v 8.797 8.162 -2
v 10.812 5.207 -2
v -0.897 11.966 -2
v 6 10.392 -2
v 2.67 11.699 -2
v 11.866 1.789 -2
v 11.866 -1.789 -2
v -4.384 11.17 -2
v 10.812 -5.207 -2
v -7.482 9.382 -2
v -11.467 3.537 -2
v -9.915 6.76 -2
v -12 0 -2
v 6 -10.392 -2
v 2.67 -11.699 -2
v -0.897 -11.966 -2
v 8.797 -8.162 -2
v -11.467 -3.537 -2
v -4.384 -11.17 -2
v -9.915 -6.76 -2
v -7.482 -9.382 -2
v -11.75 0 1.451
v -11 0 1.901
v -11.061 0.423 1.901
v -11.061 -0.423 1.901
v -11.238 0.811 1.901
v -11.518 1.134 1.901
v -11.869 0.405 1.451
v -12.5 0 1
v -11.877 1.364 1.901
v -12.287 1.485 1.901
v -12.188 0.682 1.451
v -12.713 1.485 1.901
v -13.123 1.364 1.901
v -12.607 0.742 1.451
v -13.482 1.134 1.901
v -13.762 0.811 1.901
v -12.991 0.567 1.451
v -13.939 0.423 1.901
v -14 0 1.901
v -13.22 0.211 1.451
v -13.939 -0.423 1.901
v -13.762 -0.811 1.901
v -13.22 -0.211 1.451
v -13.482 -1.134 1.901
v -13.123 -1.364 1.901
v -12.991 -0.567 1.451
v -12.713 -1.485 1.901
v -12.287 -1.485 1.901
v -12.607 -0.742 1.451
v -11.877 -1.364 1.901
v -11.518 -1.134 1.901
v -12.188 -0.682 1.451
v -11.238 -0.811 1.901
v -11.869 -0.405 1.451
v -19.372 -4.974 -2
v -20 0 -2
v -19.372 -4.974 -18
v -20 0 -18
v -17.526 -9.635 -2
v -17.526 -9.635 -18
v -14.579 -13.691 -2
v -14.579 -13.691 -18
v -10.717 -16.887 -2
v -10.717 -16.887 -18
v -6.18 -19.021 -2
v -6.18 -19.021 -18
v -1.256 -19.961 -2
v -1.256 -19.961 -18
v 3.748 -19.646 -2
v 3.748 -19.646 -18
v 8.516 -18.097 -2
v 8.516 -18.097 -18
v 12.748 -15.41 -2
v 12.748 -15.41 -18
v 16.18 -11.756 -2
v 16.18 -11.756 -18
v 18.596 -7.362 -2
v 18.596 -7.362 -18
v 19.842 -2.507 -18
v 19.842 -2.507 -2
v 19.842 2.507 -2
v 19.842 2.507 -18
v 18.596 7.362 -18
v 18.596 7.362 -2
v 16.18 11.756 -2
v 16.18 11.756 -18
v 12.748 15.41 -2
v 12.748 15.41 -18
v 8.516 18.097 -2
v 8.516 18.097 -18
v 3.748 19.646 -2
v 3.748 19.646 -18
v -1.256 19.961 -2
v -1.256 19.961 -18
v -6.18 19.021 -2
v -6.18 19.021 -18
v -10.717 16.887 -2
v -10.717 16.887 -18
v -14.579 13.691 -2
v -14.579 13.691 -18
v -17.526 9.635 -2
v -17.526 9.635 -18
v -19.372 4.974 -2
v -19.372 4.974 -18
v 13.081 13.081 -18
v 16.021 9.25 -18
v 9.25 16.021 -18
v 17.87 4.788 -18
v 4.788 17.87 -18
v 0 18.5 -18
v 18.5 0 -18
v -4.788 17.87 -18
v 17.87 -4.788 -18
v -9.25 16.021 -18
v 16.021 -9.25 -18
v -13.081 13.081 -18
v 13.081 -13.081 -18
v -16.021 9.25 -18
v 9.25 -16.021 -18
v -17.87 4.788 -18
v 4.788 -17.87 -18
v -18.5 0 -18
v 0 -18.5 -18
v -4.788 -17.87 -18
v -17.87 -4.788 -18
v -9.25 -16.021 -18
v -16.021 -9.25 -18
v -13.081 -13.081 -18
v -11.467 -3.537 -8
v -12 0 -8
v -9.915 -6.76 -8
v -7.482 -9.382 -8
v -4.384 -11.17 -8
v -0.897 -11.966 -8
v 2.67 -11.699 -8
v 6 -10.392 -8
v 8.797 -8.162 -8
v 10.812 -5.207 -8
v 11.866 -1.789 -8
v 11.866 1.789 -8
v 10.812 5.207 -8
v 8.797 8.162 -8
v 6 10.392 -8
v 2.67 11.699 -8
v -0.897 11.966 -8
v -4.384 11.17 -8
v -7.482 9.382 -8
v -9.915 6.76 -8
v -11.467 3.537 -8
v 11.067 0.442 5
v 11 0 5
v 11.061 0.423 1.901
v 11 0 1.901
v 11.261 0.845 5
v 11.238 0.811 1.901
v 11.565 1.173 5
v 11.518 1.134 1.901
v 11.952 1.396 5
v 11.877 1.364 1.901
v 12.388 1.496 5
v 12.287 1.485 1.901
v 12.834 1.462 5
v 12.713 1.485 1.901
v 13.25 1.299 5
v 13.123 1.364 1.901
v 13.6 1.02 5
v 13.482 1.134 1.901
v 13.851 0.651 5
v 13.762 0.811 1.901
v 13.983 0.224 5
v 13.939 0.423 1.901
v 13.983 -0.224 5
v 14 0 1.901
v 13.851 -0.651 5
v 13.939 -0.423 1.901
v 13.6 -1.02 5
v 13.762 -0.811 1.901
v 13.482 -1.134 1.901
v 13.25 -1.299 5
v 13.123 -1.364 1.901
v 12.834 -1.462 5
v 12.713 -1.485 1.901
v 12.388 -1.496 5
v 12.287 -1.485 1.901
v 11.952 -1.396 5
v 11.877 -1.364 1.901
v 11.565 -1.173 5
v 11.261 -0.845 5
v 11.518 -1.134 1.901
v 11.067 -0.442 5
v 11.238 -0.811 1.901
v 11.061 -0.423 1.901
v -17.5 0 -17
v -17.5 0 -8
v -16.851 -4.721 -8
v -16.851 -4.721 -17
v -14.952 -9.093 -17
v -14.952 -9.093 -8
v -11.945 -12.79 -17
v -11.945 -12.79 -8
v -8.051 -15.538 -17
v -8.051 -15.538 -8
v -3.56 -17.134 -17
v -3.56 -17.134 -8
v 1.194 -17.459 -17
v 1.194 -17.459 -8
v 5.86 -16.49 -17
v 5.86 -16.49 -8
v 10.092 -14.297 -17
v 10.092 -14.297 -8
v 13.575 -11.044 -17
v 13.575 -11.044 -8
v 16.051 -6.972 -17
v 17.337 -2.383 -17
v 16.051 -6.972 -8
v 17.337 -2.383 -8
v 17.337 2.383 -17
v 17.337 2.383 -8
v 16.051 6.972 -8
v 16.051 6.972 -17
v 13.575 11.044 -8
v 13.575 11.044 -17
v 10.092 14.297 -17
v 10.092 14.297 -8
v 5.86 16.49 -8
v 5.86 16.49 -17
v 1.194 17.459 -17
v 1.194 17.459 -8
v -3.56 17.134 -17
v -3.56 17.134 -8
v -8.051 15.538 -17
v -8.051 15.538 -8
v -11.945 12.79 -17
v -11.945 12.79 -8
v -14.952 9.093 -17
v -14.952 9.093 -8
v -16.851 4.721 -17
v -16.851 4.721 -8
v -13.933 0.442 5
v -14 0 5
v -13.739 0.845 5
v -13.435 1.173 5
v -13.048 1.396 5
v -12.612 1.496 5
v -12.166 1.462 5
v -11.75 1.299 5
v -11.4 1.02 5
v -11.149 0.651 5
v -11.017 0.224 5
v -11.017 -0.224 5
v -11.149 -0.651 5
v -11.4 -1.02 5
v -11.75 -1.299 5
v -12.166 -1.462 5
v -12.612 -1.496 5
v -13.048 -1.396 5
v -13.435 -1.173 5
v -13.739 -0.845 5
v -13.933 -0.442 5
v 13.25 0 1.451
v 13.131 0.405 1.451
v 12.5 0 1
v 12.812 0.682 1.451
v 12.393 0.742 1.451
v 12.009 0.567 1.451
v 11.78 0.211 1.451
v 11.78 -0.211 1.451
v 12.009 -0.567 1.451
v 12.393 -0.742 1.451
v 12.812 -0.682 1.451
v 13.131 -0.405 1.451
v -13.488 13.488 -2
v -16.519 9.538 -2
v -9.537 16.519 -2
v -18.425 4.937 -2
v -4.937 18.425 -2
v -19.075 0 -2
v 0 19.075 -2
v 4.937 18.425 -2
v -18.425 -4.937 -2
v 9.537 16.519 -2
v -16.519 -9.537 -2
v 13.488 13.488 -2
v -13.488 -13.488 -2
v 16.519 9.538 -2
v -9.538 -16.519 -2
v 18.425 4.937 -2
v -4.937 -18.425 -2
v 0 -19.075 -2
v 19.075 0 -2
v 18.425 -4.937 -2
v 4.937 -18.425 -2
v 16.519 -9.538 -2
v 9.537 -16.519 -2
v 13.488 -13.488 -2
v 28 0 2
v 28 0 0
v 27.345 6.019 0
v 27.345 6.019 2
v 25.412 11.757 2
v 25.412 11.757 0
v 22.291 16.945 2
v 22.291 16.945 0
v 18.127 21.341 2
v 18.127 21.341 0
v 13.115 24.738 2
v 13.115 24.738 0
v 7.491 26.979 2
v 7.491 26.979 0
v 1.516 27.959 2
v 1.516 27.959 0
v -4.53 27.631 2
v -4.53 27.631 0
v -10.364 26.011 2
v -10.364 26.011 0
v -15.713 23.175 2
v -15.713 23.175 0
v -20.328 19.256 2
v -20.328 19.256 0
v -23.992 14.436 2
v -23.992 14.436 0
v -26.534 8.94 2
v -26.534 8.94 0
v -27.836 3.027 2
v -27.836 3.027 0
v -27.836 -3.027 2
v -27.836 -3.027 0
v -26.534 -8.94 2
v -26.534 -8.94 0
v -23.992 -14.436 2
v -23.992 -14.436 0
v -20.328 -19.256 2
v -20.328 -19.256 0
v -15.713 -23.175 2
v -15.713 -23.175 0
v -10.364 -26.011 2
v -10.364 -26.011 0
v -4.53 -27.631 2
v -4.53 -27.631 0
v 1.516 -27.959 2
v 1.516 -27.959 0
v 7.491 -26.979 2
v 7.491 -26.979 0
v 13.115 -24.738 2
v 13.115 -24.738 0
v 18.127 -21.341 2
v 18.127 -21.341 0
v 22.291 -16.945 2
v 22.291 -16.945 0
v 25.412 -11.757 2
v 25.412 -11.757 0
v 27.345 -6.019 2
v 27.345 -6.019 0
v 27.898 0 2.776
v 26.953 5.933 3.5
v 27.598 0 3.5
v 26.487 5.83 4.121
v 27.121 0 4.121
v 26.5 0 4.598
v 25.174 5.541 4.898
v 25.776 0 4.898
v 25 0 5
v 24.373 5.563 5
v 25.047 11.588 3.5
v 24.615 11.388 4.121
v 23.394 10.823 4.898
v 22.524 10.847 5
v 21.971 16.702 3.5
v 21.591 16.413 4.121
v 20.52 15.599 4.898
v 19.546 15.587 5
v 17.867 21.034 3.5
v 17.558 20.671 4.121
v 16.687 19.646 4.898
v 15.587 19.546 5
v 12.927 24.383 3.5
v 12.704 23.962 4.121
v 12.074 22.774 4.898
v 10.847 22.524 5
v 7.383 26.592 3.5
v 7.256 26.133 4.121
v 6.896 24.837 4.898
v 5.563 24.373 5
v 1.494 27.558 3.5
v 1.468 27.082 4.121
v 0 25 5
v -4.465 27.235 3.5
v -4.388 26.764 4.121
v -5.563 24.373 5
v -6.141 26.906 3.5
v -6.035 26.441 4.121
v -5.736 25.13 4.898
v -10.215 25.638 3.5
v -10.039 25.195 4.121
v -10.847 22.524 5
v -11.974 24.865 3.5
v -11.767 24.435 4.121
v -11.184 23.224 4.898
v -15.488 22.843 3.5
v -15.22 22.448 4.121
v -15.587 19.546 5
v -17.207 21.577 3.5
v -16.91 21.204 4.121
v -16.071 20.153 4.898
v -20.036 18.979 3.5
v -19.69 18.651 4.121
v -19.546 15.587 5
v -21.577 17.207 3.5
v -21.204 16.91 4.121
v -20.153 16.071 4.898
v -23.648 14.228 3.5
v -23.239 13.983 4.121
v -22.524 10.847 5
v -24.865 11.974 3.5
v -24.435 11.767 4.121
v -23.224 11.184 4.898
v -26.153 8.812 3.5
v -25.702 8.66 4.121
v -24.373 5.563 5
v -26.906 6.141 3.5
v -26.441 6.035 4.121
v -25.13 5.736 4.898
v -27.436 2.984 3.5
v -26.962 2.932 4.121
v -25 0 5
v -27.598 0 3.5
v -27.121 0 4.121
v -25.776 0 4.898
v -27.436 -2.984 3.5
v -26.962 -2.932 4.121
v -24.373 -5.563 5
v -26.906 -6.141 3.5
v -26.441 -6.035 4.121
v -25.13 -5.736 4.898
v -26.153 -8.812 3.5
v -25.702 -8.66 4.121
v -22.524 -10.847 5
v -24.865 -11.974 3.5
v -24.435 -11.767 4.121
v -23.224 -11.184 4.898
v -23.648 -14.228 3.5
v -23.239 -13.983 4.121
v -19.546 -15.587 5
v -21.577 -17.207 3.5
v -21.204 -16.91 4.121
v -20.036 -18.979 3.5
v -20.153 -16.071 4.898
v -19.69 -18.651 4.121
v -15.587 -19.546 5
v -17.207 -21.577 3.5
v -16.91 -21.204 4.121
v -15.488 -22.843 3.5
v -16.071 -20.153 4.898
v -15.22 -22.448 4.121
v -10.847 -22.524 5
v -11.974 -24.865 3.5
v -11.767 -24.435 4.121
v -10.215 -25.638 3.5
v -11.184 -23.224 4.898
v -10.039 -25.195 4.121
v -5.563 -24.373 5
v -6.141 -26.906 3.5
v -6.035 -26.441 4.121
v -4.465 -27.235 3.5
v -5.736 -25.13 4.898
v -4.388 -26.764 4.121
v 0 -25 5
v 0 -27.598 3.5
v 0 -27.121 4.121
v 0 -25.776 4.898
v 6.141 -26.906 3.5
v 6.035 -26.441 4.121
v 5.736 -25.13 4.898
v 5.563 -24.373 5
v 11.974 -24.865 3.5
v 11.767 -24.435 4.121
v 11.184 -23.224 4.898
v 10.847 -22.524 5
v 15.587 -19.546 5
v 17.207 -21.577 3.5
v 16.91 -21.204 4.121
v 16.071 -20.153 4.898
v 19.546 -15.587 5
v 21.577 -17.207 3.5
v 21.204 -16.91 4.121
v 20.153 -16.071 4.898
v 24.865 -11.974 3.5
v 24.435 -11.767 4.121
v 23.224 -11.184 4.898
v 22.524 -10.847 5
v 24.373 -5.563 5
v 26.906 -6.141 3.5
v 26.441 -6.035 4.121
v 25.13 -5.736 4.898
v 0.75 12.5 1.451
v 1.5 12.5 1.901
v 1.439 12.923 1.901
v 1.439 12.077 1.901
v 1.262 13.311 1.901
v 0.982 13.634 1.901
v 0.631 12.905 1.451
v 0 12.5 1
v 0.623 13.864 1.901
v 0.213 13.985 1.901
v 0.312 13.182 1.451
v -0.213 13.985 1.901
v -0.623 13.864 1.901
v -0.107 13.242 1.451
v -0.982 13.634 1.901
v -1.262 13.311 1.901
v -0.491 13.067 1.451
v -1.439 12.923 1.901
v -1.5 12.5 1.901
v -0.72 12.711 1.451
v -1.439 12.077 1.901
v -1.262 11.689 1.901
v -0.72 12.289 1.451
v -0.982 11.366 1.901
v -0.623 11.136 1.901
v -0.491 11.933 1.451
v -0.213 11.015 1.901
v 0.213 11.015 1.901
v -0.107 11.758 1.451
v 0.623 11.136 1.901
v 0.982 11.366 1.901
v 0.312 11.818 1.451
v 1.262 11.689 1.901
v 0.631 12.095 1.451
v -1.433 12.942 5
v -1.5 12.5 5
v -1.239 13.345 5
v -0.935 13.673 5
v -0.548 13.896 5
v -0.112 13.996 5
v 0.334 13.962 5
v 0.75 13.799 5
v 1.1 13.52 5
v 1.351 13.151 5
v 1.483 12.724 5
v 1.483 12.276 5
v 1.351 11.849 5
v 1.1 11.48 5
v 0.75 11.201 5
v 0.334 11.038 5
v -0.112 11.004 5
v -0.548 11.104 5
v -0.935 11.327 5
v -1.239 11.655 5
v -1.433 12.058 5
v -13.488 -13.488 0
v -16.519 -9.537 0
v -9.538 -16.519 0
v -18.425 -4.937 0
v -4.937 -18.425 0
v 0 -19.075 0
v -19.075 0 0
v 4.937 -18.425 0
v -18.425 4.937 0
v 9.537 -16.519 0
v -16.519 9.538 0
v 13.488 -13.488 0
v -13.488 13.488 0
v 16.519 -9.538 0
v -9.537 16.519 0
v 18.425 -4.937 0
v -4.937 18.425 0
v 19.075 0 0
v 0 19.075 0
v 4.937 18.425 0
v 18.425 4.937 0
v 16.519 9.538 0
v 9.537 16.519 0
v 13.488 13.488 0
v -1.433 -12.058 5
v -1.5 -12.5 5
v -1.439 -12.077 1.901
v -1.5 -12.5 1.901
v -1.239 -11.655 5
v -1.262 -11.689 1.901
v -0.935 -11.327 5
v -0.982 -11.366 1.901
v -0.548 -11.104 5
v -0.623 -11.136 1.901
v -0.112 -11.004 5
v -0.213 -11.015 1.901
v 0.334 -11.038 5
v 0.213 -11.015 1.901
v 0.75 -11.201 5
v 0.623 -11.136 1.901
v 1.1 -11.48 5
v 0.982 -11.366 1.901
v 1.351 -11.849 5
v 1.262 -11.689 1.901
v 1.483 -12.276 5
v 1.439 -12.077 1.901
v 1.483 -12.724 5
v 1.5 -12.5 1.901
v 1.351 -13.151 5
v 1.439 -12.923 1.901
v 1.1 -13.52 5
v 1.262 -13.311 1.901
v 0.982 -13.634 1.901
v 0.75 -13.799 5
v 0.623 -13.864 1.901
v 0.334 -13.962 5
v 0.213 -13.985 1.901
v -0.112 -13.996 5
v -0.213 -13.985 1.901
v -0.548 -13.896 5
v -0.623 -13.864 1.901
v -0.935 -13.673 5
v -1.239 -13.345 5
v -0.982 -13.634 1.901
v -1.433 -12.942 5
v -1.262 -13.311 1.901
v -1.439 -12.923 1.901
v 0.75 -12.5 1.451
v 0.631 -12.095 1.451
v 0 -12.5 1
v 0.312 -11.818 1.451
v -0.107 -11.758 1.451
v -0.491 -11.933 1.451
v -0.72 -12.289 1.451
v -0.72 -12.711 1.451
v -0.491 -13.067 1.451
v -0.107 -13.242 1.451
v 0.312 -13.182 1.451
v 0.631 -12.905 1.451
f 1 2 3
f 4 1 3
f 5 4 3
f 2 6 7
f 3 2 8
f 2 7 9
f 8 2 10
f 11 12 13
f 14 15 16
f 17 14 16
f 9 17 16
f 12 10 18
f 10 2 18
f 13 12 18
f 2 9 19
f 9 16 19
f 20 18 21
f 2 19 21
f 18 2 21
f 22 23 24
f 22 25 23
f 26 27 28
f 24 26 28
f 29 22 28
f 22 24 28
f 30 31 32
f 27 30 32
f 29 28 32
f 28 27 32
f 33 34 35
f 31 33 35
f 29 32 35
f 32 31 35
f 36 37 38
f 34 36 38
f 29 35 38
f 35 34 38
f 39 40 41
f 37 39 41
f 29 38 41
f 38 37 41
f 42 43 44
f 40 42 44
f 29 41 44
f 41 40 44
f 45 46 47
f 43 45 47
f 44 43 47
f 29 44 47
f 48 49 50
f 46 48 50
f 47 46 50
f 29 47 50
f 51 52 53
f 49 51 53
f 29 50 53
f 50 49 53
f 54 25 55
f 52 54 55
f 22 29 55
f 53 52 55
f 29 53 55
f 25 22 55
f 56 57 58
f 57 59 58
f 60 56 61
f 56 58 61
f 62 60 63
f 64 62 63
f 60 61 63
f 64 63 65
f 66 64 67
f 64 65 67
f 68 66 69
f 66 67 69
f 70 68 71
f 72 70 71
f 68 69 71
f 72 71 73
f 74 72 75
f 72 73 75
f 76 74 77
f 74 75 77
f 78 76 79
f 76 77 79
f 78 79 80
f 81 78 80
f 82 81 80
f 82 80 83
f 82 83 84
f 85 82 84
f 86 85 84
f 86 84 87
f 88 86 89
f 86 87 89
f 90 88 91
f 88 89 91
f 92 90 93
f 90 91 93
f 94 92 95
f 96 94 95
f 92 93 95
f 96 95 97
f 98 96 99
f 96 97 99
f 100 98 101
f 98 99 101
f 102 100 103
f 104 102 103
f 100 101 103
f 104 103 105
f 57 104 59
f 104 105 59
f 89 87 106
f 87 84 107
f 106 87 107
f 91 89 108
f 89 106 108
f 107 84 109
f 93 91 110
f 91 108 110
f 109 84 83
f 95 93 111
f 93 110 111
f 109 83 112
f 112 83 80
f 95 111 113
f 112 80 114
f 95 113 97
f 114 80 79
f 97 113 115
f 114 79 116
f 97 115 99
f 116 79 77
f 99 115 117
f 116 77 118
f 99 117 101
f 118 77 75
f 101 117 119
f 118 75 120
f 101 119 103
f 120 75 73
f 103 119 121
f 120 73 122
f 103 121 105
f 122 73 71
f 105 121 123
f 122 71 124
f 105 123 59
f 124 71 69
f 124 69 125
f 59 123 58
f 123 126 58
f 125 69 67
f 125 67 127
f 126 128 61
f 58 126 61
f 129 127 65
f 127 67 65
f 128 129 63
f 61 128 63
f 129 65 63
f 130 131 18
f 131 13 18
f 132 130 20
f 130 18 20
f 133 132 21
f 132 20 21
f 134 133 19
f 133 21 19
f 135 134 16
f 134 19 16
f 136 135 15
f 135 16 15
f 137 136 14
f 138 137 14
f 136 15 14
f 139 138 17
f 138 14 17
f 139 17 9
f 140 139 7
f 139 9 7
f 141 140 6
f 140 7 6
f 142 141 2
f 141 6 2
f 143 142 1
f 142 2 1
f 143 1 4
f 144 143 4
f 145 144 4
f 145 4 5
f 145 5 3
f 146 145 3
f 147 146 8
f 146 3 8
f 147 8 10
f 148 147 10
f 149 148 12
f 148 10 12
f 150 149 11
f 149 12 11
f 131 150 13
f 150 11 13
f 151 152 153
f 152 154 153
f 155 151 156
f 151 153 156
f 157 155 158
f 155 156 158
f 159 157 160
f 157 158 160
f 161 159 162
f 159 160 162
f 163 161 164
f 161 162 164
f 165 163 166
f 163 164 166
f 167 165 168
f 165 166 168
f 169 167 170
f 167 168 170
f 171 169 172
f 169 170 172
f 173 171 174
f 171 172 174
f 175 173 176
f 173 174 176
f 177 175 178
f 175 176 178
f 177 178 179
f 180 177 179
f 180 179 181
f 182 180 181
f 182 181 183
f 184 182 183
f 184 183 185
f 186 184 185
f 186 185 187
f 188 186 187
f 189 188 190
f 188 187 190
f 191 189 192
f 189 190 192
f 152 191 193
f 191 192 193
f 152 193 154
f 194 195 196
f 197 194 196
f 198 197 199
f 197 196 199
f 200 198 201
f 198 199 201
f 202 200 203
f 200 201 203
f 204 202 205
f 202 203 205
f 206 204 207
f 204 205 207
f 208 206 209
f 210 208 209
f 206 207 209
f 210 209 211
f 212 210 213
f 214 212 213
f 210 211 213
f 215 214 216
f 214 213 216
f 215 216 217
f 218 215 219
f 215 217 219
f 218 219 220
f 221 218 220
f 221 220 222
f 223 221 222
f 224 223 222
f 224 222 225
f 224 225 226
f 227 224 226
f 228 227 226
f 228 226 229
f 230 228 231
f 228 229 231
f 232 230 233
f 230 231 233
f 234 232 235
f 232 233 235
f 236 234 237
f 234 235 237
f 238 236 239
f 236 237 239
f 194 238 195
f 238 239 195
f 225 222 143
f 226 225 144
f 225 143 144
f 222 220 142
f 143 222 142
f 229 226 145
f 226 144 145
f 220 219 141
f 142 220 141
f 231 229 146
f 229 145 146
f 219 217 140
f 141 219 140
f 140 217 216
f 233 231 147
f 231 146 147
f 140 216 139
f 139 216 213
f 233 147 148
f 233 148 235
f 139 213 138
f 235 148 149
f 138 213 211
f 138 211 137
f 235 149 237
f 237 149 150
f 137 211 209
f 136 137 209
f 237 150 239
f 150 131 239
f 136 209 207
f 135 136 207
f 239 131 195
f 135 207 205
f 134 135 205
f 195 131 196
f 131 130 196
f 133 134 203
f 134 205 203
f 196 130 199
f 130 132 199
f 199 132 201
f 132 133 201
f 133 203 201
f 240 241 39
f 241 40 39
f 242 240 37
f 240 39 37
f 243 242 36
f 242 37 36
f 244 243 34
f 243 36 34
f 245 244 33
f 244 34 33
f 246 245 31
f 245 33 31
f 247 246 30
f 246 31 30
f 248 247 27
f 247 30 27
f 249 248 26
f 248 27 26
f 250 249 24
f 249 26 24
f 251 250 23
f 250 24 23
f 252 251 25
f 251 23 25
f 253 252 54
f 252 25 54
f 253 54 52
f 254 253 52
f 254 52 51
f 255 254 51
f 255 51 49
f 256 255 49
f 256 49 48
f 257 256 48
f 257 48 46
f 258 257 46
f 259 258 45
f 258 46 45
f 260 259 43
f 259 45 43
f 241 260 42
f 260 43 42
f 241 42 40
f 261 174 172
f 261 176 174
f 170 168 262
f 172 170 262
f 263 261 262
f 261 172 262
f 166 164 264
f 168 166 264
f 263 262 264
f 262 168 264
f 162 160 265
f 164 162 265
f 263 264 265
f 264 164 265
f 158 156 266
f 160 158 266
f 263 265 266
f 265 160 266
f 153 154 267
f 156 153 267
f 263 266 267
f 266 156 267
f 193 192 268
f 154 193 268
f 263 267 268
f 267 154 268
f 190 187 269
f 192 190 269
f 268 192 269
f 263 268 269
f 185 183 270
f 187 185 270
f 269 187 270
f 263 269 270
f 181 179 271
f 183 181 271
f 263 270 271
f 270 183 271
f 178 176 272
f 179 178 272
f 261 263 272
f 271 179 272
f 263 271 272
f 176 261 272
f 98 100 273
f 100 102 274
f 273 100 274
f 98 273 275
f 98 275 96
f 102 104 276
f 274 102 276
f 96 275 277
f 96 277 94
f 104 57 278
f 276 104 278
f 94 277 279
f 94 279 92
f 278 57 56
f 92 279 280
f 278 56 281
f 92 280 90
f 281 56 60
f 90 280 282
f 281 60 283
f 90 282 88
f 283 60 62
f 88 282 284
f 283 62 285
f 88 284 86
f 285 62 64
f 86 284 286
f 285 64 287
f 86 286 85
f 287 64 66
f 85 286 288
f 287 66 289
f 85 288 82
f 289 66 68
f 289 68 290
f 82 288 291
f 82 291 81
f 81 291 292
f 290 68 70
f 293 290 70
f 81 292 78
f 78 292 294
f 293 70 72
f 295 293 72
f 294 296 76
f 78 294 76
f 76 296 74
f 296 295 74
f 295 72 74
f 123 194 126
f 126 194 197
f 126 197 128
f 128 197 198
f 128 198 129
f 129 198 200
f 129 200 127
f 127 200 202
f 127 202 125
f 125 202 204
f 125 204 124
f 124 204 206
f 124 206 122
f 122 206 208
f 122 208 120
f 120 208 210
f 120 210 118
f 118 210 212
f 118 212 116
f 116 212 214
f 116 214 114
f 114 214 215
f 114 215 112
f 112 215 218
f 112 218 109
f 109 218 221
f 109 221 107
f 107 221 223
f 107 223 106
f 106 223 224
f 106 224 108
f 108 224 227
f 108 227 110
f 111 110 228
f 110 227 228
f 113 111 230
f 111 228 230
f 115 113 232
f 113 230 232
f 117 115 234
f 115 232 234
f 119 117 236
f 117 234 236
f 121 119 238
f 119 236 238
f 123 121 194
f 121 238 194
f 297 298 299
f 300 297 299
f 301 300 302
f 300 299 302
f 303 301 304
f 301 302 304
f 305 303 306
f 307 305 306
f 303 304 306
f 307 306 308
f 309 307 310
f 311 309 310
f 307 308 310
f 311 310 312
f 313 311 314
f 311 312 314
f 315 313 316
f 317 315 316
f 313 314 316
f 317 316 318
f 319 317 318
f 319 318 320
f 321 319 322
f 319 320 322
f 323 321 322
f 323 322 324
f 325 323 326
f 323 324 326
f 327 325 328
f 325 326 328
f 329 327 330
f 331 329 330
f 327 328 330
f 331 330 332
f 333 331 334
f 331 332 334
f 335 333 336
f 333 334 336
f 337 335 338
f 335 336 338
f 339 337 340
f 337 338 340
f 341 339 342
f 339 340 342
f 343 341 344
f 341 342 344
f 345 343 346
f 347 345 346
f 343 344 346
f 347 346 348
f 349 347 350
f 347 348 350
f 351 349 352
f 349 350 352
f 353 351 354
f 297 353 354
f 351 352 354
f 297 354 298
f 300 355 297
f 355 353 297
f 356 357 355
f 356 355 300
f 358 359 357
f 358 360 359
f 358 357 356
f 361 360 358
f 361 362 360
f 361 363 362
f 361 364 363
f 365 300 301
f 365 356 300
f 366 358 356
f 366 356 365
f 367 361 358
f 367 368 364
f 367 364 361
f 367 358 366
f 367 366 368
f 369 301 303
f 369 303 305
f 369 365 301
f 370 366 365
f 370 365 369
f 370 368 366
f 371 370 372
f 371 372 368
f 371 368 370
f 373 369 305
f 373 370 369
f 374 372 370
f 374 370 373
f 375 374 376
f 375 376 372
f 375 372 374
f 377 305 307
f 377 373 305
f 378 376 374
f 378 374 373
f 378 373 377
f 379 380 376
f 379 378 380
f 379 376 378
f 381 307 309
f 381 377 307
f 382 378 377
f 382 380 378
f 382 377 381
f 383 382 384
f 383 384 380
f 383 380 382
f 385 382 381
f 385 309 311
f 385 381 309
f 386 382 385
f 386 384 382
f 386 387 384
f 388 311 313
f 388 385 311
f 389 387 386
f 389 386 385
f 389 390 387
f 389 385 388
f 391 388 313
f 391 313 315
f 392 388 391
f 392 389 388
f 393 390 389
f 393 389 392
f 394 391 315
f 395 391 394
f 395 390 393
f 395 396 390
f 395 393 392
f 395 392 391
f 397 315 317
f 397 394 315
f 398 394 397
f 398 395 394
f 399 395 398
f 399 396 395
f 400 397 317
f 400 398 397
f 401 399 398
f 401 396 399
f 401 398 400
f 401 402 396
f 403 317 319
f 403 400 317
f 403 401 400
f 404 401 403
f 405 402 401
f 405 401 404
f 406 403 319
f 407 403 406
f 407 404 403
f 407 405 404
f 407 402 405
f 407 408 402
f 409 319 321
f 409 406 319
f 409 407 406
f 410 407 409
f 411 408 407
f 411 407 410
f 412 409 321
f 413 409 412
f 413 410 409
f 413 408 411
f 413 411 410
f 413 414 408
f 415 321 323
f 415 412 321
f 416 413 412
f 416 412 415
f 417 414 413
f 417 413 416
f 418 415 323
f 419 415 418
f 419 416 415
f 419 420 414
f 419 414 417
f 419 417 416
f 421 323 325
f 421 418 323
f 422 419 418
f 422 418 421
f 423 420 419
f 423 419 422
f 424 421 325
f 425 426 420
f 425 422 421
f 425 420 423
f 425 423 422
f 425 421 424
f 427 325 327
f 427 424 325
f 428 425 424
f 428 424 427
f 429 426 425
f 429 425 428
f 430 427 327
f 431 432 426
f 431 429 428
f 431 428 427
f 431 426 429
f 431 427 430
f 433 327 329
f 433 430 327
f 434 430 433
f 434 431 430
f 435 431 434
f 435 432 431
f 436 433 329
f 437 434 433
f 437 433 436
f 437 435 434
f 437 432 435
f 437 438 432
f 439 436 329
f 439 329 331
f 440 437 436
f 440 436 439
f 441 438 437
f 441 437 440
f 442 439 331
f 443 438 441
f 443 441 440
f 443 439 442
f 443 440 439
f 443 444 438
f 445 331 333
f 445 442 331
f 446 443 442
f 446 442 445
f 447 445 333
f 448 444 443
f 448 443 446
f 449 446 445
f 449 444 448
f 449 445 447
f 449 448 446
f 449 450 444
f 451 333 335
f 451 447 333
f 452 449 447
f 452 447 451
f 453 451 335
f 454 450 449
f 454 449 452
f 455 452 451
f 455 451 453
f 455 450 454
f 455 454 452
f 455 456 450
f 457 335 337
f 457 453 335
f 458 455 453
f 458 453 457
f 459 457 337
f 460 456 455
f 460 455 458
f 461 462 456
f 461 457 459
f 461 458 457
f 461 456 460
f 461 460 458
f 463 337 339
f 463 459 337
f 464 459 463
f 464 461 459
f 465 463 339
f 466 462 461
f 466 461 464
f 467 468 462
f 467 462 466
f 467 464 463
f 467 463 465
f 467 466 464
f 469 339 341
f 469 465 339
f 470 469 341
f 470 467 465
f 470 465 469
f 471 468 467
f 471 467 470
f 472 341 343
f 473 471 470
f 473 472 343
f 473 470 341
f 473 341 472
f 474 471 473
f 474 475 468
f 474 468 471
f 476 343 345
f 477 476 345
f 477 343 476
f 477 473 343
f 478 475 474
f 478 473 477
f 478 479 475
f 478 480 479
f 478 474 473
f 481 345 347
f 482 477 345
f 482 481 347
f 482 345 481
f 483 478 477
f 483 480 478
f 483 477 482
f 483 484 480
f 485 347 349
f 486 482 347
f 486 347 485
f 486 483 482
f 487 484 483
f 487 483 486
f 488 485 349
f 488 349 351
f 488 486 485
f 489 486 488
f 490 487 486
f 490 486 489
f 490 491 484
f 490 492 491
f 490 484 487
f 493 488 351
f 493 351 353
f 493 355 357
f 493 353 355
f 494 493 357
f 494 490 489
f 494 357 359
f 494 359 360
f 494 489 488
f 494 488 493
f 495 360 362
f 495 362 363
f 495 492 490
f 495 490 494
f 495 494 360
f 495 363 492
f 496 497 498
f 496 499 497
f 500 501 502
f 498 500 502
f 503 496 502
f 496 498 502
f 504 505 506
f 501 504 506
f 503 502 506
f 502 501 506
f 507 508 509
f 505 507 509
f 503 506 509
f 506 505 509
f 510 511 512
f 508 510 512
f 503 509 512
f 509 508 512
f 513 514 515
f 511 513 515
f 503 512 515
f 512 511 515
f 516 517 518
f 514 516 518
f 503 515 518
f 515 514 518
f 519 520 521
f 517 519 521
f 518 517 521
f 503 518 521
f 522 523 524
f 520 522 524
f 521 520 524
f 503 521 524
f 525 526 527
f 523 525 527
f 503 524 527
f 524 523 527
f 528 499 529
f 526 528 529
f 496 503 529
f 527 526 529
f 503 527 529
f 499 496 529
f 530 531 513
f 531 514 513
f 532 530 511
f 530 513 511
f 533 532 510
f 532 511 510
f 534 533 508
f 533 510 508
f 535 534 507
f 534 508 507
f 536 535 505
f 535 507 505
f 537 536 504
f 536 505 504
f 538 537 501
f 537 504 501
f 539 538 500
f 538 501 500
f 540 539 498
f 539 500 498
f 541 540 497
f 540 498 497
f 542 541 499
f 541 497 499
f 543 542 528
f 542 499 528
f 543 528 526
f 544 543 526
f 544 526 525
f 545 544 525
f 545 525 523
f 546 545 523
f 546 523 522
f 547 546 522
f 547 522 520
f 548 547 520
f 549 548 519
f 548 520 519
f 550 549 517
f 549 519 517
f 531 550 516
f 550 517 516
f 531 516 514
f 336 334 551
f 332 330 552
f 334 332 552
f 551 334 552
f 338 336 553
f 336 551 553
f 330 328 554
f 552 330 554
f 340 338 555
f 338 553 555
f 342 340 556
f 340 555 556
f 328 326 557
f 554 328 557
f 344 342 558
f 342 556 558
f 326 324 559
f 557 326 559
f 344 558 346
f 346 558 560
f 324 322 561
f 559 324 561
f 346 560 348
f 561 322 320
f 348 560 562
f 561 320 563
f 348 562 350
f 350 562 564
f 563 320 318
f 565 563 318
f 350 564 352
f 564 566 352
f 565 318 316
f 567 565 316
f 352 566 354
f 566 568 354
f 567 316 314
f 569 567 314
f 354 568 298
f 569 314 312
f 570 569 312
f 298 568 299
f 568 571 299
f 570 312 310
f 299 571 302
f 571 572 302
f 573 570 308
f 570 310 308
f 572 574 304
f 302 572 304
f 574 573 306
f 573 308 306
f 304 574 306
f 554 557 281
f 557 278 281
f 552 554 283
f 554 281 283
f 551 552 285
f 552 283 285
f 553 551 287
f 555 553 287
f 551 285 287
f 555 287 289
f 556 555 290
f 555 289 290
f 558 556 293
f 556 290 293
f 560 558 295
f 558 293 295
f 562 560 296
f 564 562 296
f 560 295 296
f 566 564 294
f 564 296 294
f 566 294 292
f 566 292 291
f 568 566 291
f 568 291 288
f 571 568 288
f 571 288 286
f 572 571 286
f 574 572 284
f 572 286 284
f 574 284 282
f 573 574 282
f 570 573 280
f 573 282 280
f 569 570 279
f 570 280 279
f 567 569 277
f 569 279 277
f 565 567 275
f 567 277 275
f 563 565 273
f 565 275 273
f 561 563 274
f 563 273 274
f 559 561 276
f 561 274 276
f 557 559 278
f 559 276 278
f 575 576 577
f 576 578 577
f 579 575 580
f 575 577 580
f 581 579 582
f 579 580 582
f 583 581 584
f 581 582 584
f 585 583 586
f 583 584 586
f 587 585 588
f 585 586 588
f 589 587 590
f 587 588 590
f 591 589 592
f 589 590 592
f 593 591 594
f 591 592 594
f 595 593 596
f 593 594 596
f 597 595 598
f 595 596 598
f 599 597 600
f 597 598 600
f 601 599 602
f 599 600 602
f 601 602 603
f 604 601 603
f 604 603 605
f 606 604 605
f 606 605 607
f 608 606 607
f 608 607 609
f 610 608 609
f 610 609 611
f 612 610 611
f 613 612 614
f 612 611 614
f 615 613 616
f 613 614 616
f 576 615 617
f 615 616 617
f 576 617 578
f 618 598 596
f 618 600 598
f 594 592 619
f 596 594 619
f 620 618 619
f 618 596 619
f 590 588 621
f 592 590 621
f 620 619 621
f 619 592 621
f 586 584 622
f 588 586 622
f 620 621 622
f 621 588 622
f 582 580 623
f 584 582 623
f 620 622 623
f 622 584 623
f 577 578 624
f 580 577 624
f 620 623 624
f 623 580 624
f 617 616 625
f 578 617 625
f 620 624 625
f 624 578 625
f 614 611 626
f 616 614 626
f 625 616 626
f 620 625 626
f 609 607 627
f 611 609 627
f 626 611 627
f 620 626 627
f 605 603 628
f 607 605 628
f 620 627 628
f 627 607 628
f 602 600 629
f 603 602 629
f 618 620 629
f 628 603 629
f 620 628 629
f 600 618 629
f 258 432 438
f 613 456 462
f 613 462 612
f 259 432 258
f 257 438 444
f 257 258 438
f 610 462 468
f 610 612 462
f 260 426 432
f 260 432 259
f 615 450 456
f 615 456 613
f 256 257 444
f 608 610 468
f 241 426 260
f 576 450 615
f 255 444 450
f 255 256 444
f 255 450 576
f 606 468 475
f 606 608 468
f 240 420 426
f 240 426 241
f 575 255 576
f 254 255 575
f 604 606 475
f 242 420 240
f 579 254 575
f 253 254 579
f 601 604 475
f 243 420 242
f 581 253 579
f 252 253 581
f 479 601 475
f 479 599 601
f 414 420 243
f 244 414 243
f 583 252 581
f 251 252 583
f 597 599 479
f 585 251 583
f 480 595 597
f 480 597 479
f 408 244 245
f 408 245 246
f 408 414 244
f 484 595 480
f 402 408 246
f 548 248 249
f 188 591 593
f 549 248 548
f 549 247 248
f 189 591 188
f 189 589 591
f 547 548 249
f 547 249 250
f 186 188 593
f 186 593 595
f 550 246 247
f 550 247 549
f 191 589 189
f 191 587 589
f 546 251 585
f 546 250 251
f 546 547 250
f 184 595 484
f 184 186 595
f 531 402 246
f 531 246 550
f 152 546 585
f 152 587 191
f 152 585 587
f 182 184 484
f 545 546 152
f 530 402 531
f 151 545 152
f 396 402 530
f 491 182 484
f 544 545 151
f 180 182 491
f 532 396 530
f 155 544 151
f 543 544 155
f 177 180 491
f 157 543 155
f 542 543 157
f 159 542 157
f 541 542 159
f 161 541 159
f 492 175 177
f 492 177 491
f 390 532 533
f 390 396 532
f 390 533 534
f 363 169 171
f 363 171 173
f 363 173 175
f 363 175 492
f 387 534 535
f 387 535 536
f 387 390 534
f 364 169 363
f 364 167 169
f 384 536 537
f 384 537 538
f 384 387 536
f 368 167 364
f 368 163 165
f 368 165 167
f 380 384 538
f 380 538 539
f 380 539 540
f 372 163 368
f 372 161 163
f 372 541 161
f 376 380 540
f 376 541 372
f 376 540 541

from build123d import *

# Parameters (mm, degrees)
SKETCH1_R                   = 28
BOSS_EXTRUDE1_DEPTH         = 5
FILLET1_R                   = 3
CHAMFER1_SIZE               = 1
TAP_DRILL_FOR_M3_TAP1_D     = 3
TAP_DRILL_FOR_M3_TAP1_DEPTH = 3.098709071
TAP_DRILL_FOR_M3_TAP1_TIP   = 0.901290929


with BuildPart() as part:
    # Sketch1 → Boss-Extrude1 (new body)
    with BuildSketch(Plane(origin=(0, 0, 0), x_dir=(0, 1, 0), z_dir=(0, 0, 1))):
        with Locations(Location((0, 0, 0), (0, 0, 270))):
            Circle(SKETCH1_R)
    extrude(amount=BOSS_EXTRUDE1_DEPTH)

    # Fillet1
    fillet1_edges = [part.edges().sort_by_distance(p)[0] for p in [
        (-28, 0, 5),
    ]]
    fillet(fillet1_edges, radius=FILLET1_R)

    # Sketch2 → Revolve1 (revolve)
    with BuildSketch(Plane.YZ, mode=Mode.PRIVATE) as revolve1_sk:
        Polygon((-19.075, 0), (-19.075, -2), (-20, -2), (-20, -18), (-17.5, -18), (-17.5, -8), (-12, -8), (-12, -2), (0, -2), (0, 0), align=None)
    revolve(revolve1_sk.sketch.rotate(Axis((0, 0, 0), (0, 0, 1)), 270), axis=Axis((0, 0, 0), (0, 0, 1)))

    # Chamfer1
    chamfer1_edges = [part.edges().sort_by_distance(p)[0] for p in [
        (17.5, 0, -18),
    ]]
    chamfer(chamfer1_edges, length=CHAMFER1_SIZE)

    # Tap Drill for M3 Tap1
    with Locations(Plane.XY.offset(5)):
        with Locations((0, 12.5), (-12.5, 0), (0, -12.5), (12.5, 0)):
            Hole(TAP_DRILL_FOR_M3_TAP1_D / 2, depth=TAP_DRILL_FOR_M3_TAP1_DEPTH)
            with Locations((0, 0, -(TAP_DRILL_FOR_M3_TAP1_DEPTH + TAP_DRILL_FOR_M3_TAP1_TIP / 2))):  # 118° drill point
                Cone(0, TAP_DRILL_FOR_M3_TAP1_D / 2, TAP_DRILL_FOR_M3_TAP1_TIP, mode=Mode.SUBTRACT)


solid = part.part
